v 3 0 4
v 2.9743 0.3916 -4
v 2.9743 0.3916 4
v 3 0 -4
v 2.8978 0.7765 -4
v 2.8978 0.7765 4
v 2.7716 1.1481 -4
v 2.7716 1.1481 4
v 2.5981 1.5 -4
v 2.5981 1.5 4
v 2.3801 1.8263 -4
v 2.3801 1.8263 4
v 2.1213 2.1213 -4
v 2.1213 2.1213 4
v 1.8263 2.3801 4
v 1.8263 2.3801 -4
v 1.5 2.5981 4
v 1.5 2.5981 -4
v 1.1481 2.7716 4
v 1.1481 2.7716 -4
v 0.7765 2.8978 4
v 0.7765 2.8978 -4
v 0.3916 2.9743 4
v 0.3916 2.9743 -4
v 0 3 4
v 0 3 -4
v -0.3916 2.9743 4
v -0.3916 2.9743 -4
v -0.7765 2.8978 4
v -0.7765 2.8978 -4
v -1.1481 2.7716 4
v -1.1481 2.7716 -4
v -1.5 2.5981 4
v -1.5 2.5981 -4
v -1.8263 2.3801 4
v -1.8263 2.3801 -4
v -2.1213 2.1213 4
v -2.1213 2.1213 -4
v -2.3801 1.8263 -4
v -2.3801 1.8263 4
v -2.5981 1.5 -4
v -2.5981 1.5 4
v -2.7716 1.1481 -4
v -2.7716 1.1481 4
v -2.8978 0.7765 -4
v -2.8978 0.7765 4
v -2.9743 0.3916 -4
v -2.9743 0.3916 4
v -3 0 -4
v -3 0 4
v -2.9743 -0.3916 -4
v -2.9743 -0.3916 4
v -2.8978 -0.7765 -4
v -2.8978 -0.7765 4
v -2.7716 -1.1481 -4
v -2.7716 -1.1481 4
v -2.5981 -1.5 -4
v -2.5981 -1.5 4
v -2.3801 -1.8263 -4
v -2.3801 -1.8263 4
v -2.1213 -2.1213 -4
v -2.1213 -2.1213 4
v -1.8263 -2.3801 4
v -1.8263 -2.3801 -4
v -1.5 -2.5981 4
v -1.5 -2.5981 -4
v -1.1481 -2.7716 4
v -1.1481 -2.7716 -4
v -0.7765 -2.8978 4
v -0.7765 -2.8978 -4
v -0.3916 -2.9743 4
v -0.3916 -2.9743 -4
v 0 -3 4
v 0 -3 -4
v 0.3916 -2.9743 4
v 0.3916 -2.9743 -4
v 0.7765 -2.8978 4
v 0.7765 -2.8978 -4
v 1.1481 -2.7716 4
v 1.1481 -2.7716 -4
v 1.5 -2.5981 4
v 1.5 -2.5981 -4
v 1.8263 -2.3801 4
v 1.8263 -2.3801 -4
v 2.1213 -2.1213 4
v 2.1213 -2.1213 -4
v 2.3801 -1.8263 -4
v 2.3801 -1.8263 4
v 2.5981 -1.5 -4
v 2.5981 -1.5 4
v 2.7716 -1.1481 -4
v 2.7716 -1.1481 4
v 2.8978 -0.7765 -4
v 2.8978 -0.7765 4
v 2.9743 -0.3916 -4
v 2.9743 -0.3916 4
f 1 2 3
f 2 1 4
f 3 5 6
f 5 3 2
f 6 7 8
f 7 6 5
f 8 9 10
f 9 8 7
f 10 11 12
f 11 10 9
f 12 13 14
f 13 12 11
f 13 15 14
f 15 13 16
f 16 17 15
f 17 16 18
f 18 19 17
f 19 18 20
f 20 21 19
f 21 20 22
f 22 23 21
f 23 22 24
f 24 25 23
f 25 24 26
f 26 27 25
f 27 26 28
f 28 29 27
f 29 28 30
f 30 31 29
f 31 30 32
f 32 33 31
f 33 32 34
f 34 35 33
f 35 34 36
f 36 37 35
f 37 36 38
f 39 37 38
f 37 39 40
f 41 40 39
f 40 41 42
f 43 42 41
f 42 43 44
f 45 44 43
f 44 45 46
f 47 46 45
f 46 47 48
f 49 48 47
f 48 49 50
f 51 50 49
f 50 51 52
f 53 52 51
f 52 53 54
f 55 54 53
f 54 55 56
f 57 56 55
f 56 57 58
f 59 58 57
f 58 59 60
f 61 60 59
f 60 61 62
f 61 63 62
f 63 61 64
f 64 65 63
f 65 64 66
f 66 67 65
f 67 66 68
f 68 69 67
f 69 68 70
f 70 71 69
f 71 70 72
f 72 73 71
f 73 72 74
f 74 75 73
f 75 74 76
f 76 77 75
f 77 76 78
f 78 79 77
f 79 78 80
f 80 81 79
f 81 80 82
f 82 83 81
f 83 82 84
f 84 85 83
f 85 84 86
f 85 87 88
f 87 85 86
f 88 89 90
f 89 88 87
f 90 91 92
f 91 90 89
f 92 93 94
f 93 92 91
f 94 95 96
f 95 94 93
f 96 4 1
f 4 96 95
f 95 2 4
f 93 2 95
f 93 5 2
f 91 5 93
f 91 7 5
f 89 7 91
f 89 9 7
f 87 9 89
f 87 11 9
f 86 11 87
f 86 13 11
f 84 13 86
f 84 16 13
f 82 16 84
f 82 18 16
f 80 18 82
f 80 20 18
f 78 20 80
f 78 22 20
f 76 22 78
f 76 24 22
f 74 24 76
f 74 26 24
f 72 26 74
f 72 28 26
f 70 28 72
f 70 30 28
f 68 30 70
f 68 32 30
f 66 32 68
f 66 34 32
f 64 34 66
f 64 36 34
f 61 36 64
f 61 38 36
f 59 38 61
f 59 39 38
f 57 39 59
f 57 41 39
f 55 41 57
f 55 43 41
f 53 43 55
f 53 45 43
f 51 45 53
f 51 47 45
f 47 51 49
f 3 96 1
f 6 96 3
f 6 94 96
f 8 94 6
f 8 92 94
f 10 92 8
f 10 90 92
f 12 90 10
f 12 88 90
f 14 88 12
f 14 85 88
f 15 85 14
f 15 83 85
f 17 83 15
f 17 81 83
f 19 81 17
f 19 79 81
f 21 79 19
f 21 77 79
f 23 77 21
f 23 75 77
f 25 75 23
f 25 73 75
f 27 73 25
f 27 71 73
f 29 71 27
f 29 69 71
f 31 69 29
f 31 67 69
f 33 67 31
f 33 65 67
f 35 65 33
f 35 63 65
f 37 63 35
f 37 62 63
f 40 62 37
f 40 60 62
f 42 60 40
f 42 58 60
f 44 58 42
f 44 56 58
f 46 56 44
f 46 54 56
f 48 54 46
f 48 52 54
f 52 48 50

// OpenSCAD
height = 8;
radius = 3;
centered = true;
$fn = 48;

cylinder(h = height, r1 = radius, r2 = radius, center = centered);
